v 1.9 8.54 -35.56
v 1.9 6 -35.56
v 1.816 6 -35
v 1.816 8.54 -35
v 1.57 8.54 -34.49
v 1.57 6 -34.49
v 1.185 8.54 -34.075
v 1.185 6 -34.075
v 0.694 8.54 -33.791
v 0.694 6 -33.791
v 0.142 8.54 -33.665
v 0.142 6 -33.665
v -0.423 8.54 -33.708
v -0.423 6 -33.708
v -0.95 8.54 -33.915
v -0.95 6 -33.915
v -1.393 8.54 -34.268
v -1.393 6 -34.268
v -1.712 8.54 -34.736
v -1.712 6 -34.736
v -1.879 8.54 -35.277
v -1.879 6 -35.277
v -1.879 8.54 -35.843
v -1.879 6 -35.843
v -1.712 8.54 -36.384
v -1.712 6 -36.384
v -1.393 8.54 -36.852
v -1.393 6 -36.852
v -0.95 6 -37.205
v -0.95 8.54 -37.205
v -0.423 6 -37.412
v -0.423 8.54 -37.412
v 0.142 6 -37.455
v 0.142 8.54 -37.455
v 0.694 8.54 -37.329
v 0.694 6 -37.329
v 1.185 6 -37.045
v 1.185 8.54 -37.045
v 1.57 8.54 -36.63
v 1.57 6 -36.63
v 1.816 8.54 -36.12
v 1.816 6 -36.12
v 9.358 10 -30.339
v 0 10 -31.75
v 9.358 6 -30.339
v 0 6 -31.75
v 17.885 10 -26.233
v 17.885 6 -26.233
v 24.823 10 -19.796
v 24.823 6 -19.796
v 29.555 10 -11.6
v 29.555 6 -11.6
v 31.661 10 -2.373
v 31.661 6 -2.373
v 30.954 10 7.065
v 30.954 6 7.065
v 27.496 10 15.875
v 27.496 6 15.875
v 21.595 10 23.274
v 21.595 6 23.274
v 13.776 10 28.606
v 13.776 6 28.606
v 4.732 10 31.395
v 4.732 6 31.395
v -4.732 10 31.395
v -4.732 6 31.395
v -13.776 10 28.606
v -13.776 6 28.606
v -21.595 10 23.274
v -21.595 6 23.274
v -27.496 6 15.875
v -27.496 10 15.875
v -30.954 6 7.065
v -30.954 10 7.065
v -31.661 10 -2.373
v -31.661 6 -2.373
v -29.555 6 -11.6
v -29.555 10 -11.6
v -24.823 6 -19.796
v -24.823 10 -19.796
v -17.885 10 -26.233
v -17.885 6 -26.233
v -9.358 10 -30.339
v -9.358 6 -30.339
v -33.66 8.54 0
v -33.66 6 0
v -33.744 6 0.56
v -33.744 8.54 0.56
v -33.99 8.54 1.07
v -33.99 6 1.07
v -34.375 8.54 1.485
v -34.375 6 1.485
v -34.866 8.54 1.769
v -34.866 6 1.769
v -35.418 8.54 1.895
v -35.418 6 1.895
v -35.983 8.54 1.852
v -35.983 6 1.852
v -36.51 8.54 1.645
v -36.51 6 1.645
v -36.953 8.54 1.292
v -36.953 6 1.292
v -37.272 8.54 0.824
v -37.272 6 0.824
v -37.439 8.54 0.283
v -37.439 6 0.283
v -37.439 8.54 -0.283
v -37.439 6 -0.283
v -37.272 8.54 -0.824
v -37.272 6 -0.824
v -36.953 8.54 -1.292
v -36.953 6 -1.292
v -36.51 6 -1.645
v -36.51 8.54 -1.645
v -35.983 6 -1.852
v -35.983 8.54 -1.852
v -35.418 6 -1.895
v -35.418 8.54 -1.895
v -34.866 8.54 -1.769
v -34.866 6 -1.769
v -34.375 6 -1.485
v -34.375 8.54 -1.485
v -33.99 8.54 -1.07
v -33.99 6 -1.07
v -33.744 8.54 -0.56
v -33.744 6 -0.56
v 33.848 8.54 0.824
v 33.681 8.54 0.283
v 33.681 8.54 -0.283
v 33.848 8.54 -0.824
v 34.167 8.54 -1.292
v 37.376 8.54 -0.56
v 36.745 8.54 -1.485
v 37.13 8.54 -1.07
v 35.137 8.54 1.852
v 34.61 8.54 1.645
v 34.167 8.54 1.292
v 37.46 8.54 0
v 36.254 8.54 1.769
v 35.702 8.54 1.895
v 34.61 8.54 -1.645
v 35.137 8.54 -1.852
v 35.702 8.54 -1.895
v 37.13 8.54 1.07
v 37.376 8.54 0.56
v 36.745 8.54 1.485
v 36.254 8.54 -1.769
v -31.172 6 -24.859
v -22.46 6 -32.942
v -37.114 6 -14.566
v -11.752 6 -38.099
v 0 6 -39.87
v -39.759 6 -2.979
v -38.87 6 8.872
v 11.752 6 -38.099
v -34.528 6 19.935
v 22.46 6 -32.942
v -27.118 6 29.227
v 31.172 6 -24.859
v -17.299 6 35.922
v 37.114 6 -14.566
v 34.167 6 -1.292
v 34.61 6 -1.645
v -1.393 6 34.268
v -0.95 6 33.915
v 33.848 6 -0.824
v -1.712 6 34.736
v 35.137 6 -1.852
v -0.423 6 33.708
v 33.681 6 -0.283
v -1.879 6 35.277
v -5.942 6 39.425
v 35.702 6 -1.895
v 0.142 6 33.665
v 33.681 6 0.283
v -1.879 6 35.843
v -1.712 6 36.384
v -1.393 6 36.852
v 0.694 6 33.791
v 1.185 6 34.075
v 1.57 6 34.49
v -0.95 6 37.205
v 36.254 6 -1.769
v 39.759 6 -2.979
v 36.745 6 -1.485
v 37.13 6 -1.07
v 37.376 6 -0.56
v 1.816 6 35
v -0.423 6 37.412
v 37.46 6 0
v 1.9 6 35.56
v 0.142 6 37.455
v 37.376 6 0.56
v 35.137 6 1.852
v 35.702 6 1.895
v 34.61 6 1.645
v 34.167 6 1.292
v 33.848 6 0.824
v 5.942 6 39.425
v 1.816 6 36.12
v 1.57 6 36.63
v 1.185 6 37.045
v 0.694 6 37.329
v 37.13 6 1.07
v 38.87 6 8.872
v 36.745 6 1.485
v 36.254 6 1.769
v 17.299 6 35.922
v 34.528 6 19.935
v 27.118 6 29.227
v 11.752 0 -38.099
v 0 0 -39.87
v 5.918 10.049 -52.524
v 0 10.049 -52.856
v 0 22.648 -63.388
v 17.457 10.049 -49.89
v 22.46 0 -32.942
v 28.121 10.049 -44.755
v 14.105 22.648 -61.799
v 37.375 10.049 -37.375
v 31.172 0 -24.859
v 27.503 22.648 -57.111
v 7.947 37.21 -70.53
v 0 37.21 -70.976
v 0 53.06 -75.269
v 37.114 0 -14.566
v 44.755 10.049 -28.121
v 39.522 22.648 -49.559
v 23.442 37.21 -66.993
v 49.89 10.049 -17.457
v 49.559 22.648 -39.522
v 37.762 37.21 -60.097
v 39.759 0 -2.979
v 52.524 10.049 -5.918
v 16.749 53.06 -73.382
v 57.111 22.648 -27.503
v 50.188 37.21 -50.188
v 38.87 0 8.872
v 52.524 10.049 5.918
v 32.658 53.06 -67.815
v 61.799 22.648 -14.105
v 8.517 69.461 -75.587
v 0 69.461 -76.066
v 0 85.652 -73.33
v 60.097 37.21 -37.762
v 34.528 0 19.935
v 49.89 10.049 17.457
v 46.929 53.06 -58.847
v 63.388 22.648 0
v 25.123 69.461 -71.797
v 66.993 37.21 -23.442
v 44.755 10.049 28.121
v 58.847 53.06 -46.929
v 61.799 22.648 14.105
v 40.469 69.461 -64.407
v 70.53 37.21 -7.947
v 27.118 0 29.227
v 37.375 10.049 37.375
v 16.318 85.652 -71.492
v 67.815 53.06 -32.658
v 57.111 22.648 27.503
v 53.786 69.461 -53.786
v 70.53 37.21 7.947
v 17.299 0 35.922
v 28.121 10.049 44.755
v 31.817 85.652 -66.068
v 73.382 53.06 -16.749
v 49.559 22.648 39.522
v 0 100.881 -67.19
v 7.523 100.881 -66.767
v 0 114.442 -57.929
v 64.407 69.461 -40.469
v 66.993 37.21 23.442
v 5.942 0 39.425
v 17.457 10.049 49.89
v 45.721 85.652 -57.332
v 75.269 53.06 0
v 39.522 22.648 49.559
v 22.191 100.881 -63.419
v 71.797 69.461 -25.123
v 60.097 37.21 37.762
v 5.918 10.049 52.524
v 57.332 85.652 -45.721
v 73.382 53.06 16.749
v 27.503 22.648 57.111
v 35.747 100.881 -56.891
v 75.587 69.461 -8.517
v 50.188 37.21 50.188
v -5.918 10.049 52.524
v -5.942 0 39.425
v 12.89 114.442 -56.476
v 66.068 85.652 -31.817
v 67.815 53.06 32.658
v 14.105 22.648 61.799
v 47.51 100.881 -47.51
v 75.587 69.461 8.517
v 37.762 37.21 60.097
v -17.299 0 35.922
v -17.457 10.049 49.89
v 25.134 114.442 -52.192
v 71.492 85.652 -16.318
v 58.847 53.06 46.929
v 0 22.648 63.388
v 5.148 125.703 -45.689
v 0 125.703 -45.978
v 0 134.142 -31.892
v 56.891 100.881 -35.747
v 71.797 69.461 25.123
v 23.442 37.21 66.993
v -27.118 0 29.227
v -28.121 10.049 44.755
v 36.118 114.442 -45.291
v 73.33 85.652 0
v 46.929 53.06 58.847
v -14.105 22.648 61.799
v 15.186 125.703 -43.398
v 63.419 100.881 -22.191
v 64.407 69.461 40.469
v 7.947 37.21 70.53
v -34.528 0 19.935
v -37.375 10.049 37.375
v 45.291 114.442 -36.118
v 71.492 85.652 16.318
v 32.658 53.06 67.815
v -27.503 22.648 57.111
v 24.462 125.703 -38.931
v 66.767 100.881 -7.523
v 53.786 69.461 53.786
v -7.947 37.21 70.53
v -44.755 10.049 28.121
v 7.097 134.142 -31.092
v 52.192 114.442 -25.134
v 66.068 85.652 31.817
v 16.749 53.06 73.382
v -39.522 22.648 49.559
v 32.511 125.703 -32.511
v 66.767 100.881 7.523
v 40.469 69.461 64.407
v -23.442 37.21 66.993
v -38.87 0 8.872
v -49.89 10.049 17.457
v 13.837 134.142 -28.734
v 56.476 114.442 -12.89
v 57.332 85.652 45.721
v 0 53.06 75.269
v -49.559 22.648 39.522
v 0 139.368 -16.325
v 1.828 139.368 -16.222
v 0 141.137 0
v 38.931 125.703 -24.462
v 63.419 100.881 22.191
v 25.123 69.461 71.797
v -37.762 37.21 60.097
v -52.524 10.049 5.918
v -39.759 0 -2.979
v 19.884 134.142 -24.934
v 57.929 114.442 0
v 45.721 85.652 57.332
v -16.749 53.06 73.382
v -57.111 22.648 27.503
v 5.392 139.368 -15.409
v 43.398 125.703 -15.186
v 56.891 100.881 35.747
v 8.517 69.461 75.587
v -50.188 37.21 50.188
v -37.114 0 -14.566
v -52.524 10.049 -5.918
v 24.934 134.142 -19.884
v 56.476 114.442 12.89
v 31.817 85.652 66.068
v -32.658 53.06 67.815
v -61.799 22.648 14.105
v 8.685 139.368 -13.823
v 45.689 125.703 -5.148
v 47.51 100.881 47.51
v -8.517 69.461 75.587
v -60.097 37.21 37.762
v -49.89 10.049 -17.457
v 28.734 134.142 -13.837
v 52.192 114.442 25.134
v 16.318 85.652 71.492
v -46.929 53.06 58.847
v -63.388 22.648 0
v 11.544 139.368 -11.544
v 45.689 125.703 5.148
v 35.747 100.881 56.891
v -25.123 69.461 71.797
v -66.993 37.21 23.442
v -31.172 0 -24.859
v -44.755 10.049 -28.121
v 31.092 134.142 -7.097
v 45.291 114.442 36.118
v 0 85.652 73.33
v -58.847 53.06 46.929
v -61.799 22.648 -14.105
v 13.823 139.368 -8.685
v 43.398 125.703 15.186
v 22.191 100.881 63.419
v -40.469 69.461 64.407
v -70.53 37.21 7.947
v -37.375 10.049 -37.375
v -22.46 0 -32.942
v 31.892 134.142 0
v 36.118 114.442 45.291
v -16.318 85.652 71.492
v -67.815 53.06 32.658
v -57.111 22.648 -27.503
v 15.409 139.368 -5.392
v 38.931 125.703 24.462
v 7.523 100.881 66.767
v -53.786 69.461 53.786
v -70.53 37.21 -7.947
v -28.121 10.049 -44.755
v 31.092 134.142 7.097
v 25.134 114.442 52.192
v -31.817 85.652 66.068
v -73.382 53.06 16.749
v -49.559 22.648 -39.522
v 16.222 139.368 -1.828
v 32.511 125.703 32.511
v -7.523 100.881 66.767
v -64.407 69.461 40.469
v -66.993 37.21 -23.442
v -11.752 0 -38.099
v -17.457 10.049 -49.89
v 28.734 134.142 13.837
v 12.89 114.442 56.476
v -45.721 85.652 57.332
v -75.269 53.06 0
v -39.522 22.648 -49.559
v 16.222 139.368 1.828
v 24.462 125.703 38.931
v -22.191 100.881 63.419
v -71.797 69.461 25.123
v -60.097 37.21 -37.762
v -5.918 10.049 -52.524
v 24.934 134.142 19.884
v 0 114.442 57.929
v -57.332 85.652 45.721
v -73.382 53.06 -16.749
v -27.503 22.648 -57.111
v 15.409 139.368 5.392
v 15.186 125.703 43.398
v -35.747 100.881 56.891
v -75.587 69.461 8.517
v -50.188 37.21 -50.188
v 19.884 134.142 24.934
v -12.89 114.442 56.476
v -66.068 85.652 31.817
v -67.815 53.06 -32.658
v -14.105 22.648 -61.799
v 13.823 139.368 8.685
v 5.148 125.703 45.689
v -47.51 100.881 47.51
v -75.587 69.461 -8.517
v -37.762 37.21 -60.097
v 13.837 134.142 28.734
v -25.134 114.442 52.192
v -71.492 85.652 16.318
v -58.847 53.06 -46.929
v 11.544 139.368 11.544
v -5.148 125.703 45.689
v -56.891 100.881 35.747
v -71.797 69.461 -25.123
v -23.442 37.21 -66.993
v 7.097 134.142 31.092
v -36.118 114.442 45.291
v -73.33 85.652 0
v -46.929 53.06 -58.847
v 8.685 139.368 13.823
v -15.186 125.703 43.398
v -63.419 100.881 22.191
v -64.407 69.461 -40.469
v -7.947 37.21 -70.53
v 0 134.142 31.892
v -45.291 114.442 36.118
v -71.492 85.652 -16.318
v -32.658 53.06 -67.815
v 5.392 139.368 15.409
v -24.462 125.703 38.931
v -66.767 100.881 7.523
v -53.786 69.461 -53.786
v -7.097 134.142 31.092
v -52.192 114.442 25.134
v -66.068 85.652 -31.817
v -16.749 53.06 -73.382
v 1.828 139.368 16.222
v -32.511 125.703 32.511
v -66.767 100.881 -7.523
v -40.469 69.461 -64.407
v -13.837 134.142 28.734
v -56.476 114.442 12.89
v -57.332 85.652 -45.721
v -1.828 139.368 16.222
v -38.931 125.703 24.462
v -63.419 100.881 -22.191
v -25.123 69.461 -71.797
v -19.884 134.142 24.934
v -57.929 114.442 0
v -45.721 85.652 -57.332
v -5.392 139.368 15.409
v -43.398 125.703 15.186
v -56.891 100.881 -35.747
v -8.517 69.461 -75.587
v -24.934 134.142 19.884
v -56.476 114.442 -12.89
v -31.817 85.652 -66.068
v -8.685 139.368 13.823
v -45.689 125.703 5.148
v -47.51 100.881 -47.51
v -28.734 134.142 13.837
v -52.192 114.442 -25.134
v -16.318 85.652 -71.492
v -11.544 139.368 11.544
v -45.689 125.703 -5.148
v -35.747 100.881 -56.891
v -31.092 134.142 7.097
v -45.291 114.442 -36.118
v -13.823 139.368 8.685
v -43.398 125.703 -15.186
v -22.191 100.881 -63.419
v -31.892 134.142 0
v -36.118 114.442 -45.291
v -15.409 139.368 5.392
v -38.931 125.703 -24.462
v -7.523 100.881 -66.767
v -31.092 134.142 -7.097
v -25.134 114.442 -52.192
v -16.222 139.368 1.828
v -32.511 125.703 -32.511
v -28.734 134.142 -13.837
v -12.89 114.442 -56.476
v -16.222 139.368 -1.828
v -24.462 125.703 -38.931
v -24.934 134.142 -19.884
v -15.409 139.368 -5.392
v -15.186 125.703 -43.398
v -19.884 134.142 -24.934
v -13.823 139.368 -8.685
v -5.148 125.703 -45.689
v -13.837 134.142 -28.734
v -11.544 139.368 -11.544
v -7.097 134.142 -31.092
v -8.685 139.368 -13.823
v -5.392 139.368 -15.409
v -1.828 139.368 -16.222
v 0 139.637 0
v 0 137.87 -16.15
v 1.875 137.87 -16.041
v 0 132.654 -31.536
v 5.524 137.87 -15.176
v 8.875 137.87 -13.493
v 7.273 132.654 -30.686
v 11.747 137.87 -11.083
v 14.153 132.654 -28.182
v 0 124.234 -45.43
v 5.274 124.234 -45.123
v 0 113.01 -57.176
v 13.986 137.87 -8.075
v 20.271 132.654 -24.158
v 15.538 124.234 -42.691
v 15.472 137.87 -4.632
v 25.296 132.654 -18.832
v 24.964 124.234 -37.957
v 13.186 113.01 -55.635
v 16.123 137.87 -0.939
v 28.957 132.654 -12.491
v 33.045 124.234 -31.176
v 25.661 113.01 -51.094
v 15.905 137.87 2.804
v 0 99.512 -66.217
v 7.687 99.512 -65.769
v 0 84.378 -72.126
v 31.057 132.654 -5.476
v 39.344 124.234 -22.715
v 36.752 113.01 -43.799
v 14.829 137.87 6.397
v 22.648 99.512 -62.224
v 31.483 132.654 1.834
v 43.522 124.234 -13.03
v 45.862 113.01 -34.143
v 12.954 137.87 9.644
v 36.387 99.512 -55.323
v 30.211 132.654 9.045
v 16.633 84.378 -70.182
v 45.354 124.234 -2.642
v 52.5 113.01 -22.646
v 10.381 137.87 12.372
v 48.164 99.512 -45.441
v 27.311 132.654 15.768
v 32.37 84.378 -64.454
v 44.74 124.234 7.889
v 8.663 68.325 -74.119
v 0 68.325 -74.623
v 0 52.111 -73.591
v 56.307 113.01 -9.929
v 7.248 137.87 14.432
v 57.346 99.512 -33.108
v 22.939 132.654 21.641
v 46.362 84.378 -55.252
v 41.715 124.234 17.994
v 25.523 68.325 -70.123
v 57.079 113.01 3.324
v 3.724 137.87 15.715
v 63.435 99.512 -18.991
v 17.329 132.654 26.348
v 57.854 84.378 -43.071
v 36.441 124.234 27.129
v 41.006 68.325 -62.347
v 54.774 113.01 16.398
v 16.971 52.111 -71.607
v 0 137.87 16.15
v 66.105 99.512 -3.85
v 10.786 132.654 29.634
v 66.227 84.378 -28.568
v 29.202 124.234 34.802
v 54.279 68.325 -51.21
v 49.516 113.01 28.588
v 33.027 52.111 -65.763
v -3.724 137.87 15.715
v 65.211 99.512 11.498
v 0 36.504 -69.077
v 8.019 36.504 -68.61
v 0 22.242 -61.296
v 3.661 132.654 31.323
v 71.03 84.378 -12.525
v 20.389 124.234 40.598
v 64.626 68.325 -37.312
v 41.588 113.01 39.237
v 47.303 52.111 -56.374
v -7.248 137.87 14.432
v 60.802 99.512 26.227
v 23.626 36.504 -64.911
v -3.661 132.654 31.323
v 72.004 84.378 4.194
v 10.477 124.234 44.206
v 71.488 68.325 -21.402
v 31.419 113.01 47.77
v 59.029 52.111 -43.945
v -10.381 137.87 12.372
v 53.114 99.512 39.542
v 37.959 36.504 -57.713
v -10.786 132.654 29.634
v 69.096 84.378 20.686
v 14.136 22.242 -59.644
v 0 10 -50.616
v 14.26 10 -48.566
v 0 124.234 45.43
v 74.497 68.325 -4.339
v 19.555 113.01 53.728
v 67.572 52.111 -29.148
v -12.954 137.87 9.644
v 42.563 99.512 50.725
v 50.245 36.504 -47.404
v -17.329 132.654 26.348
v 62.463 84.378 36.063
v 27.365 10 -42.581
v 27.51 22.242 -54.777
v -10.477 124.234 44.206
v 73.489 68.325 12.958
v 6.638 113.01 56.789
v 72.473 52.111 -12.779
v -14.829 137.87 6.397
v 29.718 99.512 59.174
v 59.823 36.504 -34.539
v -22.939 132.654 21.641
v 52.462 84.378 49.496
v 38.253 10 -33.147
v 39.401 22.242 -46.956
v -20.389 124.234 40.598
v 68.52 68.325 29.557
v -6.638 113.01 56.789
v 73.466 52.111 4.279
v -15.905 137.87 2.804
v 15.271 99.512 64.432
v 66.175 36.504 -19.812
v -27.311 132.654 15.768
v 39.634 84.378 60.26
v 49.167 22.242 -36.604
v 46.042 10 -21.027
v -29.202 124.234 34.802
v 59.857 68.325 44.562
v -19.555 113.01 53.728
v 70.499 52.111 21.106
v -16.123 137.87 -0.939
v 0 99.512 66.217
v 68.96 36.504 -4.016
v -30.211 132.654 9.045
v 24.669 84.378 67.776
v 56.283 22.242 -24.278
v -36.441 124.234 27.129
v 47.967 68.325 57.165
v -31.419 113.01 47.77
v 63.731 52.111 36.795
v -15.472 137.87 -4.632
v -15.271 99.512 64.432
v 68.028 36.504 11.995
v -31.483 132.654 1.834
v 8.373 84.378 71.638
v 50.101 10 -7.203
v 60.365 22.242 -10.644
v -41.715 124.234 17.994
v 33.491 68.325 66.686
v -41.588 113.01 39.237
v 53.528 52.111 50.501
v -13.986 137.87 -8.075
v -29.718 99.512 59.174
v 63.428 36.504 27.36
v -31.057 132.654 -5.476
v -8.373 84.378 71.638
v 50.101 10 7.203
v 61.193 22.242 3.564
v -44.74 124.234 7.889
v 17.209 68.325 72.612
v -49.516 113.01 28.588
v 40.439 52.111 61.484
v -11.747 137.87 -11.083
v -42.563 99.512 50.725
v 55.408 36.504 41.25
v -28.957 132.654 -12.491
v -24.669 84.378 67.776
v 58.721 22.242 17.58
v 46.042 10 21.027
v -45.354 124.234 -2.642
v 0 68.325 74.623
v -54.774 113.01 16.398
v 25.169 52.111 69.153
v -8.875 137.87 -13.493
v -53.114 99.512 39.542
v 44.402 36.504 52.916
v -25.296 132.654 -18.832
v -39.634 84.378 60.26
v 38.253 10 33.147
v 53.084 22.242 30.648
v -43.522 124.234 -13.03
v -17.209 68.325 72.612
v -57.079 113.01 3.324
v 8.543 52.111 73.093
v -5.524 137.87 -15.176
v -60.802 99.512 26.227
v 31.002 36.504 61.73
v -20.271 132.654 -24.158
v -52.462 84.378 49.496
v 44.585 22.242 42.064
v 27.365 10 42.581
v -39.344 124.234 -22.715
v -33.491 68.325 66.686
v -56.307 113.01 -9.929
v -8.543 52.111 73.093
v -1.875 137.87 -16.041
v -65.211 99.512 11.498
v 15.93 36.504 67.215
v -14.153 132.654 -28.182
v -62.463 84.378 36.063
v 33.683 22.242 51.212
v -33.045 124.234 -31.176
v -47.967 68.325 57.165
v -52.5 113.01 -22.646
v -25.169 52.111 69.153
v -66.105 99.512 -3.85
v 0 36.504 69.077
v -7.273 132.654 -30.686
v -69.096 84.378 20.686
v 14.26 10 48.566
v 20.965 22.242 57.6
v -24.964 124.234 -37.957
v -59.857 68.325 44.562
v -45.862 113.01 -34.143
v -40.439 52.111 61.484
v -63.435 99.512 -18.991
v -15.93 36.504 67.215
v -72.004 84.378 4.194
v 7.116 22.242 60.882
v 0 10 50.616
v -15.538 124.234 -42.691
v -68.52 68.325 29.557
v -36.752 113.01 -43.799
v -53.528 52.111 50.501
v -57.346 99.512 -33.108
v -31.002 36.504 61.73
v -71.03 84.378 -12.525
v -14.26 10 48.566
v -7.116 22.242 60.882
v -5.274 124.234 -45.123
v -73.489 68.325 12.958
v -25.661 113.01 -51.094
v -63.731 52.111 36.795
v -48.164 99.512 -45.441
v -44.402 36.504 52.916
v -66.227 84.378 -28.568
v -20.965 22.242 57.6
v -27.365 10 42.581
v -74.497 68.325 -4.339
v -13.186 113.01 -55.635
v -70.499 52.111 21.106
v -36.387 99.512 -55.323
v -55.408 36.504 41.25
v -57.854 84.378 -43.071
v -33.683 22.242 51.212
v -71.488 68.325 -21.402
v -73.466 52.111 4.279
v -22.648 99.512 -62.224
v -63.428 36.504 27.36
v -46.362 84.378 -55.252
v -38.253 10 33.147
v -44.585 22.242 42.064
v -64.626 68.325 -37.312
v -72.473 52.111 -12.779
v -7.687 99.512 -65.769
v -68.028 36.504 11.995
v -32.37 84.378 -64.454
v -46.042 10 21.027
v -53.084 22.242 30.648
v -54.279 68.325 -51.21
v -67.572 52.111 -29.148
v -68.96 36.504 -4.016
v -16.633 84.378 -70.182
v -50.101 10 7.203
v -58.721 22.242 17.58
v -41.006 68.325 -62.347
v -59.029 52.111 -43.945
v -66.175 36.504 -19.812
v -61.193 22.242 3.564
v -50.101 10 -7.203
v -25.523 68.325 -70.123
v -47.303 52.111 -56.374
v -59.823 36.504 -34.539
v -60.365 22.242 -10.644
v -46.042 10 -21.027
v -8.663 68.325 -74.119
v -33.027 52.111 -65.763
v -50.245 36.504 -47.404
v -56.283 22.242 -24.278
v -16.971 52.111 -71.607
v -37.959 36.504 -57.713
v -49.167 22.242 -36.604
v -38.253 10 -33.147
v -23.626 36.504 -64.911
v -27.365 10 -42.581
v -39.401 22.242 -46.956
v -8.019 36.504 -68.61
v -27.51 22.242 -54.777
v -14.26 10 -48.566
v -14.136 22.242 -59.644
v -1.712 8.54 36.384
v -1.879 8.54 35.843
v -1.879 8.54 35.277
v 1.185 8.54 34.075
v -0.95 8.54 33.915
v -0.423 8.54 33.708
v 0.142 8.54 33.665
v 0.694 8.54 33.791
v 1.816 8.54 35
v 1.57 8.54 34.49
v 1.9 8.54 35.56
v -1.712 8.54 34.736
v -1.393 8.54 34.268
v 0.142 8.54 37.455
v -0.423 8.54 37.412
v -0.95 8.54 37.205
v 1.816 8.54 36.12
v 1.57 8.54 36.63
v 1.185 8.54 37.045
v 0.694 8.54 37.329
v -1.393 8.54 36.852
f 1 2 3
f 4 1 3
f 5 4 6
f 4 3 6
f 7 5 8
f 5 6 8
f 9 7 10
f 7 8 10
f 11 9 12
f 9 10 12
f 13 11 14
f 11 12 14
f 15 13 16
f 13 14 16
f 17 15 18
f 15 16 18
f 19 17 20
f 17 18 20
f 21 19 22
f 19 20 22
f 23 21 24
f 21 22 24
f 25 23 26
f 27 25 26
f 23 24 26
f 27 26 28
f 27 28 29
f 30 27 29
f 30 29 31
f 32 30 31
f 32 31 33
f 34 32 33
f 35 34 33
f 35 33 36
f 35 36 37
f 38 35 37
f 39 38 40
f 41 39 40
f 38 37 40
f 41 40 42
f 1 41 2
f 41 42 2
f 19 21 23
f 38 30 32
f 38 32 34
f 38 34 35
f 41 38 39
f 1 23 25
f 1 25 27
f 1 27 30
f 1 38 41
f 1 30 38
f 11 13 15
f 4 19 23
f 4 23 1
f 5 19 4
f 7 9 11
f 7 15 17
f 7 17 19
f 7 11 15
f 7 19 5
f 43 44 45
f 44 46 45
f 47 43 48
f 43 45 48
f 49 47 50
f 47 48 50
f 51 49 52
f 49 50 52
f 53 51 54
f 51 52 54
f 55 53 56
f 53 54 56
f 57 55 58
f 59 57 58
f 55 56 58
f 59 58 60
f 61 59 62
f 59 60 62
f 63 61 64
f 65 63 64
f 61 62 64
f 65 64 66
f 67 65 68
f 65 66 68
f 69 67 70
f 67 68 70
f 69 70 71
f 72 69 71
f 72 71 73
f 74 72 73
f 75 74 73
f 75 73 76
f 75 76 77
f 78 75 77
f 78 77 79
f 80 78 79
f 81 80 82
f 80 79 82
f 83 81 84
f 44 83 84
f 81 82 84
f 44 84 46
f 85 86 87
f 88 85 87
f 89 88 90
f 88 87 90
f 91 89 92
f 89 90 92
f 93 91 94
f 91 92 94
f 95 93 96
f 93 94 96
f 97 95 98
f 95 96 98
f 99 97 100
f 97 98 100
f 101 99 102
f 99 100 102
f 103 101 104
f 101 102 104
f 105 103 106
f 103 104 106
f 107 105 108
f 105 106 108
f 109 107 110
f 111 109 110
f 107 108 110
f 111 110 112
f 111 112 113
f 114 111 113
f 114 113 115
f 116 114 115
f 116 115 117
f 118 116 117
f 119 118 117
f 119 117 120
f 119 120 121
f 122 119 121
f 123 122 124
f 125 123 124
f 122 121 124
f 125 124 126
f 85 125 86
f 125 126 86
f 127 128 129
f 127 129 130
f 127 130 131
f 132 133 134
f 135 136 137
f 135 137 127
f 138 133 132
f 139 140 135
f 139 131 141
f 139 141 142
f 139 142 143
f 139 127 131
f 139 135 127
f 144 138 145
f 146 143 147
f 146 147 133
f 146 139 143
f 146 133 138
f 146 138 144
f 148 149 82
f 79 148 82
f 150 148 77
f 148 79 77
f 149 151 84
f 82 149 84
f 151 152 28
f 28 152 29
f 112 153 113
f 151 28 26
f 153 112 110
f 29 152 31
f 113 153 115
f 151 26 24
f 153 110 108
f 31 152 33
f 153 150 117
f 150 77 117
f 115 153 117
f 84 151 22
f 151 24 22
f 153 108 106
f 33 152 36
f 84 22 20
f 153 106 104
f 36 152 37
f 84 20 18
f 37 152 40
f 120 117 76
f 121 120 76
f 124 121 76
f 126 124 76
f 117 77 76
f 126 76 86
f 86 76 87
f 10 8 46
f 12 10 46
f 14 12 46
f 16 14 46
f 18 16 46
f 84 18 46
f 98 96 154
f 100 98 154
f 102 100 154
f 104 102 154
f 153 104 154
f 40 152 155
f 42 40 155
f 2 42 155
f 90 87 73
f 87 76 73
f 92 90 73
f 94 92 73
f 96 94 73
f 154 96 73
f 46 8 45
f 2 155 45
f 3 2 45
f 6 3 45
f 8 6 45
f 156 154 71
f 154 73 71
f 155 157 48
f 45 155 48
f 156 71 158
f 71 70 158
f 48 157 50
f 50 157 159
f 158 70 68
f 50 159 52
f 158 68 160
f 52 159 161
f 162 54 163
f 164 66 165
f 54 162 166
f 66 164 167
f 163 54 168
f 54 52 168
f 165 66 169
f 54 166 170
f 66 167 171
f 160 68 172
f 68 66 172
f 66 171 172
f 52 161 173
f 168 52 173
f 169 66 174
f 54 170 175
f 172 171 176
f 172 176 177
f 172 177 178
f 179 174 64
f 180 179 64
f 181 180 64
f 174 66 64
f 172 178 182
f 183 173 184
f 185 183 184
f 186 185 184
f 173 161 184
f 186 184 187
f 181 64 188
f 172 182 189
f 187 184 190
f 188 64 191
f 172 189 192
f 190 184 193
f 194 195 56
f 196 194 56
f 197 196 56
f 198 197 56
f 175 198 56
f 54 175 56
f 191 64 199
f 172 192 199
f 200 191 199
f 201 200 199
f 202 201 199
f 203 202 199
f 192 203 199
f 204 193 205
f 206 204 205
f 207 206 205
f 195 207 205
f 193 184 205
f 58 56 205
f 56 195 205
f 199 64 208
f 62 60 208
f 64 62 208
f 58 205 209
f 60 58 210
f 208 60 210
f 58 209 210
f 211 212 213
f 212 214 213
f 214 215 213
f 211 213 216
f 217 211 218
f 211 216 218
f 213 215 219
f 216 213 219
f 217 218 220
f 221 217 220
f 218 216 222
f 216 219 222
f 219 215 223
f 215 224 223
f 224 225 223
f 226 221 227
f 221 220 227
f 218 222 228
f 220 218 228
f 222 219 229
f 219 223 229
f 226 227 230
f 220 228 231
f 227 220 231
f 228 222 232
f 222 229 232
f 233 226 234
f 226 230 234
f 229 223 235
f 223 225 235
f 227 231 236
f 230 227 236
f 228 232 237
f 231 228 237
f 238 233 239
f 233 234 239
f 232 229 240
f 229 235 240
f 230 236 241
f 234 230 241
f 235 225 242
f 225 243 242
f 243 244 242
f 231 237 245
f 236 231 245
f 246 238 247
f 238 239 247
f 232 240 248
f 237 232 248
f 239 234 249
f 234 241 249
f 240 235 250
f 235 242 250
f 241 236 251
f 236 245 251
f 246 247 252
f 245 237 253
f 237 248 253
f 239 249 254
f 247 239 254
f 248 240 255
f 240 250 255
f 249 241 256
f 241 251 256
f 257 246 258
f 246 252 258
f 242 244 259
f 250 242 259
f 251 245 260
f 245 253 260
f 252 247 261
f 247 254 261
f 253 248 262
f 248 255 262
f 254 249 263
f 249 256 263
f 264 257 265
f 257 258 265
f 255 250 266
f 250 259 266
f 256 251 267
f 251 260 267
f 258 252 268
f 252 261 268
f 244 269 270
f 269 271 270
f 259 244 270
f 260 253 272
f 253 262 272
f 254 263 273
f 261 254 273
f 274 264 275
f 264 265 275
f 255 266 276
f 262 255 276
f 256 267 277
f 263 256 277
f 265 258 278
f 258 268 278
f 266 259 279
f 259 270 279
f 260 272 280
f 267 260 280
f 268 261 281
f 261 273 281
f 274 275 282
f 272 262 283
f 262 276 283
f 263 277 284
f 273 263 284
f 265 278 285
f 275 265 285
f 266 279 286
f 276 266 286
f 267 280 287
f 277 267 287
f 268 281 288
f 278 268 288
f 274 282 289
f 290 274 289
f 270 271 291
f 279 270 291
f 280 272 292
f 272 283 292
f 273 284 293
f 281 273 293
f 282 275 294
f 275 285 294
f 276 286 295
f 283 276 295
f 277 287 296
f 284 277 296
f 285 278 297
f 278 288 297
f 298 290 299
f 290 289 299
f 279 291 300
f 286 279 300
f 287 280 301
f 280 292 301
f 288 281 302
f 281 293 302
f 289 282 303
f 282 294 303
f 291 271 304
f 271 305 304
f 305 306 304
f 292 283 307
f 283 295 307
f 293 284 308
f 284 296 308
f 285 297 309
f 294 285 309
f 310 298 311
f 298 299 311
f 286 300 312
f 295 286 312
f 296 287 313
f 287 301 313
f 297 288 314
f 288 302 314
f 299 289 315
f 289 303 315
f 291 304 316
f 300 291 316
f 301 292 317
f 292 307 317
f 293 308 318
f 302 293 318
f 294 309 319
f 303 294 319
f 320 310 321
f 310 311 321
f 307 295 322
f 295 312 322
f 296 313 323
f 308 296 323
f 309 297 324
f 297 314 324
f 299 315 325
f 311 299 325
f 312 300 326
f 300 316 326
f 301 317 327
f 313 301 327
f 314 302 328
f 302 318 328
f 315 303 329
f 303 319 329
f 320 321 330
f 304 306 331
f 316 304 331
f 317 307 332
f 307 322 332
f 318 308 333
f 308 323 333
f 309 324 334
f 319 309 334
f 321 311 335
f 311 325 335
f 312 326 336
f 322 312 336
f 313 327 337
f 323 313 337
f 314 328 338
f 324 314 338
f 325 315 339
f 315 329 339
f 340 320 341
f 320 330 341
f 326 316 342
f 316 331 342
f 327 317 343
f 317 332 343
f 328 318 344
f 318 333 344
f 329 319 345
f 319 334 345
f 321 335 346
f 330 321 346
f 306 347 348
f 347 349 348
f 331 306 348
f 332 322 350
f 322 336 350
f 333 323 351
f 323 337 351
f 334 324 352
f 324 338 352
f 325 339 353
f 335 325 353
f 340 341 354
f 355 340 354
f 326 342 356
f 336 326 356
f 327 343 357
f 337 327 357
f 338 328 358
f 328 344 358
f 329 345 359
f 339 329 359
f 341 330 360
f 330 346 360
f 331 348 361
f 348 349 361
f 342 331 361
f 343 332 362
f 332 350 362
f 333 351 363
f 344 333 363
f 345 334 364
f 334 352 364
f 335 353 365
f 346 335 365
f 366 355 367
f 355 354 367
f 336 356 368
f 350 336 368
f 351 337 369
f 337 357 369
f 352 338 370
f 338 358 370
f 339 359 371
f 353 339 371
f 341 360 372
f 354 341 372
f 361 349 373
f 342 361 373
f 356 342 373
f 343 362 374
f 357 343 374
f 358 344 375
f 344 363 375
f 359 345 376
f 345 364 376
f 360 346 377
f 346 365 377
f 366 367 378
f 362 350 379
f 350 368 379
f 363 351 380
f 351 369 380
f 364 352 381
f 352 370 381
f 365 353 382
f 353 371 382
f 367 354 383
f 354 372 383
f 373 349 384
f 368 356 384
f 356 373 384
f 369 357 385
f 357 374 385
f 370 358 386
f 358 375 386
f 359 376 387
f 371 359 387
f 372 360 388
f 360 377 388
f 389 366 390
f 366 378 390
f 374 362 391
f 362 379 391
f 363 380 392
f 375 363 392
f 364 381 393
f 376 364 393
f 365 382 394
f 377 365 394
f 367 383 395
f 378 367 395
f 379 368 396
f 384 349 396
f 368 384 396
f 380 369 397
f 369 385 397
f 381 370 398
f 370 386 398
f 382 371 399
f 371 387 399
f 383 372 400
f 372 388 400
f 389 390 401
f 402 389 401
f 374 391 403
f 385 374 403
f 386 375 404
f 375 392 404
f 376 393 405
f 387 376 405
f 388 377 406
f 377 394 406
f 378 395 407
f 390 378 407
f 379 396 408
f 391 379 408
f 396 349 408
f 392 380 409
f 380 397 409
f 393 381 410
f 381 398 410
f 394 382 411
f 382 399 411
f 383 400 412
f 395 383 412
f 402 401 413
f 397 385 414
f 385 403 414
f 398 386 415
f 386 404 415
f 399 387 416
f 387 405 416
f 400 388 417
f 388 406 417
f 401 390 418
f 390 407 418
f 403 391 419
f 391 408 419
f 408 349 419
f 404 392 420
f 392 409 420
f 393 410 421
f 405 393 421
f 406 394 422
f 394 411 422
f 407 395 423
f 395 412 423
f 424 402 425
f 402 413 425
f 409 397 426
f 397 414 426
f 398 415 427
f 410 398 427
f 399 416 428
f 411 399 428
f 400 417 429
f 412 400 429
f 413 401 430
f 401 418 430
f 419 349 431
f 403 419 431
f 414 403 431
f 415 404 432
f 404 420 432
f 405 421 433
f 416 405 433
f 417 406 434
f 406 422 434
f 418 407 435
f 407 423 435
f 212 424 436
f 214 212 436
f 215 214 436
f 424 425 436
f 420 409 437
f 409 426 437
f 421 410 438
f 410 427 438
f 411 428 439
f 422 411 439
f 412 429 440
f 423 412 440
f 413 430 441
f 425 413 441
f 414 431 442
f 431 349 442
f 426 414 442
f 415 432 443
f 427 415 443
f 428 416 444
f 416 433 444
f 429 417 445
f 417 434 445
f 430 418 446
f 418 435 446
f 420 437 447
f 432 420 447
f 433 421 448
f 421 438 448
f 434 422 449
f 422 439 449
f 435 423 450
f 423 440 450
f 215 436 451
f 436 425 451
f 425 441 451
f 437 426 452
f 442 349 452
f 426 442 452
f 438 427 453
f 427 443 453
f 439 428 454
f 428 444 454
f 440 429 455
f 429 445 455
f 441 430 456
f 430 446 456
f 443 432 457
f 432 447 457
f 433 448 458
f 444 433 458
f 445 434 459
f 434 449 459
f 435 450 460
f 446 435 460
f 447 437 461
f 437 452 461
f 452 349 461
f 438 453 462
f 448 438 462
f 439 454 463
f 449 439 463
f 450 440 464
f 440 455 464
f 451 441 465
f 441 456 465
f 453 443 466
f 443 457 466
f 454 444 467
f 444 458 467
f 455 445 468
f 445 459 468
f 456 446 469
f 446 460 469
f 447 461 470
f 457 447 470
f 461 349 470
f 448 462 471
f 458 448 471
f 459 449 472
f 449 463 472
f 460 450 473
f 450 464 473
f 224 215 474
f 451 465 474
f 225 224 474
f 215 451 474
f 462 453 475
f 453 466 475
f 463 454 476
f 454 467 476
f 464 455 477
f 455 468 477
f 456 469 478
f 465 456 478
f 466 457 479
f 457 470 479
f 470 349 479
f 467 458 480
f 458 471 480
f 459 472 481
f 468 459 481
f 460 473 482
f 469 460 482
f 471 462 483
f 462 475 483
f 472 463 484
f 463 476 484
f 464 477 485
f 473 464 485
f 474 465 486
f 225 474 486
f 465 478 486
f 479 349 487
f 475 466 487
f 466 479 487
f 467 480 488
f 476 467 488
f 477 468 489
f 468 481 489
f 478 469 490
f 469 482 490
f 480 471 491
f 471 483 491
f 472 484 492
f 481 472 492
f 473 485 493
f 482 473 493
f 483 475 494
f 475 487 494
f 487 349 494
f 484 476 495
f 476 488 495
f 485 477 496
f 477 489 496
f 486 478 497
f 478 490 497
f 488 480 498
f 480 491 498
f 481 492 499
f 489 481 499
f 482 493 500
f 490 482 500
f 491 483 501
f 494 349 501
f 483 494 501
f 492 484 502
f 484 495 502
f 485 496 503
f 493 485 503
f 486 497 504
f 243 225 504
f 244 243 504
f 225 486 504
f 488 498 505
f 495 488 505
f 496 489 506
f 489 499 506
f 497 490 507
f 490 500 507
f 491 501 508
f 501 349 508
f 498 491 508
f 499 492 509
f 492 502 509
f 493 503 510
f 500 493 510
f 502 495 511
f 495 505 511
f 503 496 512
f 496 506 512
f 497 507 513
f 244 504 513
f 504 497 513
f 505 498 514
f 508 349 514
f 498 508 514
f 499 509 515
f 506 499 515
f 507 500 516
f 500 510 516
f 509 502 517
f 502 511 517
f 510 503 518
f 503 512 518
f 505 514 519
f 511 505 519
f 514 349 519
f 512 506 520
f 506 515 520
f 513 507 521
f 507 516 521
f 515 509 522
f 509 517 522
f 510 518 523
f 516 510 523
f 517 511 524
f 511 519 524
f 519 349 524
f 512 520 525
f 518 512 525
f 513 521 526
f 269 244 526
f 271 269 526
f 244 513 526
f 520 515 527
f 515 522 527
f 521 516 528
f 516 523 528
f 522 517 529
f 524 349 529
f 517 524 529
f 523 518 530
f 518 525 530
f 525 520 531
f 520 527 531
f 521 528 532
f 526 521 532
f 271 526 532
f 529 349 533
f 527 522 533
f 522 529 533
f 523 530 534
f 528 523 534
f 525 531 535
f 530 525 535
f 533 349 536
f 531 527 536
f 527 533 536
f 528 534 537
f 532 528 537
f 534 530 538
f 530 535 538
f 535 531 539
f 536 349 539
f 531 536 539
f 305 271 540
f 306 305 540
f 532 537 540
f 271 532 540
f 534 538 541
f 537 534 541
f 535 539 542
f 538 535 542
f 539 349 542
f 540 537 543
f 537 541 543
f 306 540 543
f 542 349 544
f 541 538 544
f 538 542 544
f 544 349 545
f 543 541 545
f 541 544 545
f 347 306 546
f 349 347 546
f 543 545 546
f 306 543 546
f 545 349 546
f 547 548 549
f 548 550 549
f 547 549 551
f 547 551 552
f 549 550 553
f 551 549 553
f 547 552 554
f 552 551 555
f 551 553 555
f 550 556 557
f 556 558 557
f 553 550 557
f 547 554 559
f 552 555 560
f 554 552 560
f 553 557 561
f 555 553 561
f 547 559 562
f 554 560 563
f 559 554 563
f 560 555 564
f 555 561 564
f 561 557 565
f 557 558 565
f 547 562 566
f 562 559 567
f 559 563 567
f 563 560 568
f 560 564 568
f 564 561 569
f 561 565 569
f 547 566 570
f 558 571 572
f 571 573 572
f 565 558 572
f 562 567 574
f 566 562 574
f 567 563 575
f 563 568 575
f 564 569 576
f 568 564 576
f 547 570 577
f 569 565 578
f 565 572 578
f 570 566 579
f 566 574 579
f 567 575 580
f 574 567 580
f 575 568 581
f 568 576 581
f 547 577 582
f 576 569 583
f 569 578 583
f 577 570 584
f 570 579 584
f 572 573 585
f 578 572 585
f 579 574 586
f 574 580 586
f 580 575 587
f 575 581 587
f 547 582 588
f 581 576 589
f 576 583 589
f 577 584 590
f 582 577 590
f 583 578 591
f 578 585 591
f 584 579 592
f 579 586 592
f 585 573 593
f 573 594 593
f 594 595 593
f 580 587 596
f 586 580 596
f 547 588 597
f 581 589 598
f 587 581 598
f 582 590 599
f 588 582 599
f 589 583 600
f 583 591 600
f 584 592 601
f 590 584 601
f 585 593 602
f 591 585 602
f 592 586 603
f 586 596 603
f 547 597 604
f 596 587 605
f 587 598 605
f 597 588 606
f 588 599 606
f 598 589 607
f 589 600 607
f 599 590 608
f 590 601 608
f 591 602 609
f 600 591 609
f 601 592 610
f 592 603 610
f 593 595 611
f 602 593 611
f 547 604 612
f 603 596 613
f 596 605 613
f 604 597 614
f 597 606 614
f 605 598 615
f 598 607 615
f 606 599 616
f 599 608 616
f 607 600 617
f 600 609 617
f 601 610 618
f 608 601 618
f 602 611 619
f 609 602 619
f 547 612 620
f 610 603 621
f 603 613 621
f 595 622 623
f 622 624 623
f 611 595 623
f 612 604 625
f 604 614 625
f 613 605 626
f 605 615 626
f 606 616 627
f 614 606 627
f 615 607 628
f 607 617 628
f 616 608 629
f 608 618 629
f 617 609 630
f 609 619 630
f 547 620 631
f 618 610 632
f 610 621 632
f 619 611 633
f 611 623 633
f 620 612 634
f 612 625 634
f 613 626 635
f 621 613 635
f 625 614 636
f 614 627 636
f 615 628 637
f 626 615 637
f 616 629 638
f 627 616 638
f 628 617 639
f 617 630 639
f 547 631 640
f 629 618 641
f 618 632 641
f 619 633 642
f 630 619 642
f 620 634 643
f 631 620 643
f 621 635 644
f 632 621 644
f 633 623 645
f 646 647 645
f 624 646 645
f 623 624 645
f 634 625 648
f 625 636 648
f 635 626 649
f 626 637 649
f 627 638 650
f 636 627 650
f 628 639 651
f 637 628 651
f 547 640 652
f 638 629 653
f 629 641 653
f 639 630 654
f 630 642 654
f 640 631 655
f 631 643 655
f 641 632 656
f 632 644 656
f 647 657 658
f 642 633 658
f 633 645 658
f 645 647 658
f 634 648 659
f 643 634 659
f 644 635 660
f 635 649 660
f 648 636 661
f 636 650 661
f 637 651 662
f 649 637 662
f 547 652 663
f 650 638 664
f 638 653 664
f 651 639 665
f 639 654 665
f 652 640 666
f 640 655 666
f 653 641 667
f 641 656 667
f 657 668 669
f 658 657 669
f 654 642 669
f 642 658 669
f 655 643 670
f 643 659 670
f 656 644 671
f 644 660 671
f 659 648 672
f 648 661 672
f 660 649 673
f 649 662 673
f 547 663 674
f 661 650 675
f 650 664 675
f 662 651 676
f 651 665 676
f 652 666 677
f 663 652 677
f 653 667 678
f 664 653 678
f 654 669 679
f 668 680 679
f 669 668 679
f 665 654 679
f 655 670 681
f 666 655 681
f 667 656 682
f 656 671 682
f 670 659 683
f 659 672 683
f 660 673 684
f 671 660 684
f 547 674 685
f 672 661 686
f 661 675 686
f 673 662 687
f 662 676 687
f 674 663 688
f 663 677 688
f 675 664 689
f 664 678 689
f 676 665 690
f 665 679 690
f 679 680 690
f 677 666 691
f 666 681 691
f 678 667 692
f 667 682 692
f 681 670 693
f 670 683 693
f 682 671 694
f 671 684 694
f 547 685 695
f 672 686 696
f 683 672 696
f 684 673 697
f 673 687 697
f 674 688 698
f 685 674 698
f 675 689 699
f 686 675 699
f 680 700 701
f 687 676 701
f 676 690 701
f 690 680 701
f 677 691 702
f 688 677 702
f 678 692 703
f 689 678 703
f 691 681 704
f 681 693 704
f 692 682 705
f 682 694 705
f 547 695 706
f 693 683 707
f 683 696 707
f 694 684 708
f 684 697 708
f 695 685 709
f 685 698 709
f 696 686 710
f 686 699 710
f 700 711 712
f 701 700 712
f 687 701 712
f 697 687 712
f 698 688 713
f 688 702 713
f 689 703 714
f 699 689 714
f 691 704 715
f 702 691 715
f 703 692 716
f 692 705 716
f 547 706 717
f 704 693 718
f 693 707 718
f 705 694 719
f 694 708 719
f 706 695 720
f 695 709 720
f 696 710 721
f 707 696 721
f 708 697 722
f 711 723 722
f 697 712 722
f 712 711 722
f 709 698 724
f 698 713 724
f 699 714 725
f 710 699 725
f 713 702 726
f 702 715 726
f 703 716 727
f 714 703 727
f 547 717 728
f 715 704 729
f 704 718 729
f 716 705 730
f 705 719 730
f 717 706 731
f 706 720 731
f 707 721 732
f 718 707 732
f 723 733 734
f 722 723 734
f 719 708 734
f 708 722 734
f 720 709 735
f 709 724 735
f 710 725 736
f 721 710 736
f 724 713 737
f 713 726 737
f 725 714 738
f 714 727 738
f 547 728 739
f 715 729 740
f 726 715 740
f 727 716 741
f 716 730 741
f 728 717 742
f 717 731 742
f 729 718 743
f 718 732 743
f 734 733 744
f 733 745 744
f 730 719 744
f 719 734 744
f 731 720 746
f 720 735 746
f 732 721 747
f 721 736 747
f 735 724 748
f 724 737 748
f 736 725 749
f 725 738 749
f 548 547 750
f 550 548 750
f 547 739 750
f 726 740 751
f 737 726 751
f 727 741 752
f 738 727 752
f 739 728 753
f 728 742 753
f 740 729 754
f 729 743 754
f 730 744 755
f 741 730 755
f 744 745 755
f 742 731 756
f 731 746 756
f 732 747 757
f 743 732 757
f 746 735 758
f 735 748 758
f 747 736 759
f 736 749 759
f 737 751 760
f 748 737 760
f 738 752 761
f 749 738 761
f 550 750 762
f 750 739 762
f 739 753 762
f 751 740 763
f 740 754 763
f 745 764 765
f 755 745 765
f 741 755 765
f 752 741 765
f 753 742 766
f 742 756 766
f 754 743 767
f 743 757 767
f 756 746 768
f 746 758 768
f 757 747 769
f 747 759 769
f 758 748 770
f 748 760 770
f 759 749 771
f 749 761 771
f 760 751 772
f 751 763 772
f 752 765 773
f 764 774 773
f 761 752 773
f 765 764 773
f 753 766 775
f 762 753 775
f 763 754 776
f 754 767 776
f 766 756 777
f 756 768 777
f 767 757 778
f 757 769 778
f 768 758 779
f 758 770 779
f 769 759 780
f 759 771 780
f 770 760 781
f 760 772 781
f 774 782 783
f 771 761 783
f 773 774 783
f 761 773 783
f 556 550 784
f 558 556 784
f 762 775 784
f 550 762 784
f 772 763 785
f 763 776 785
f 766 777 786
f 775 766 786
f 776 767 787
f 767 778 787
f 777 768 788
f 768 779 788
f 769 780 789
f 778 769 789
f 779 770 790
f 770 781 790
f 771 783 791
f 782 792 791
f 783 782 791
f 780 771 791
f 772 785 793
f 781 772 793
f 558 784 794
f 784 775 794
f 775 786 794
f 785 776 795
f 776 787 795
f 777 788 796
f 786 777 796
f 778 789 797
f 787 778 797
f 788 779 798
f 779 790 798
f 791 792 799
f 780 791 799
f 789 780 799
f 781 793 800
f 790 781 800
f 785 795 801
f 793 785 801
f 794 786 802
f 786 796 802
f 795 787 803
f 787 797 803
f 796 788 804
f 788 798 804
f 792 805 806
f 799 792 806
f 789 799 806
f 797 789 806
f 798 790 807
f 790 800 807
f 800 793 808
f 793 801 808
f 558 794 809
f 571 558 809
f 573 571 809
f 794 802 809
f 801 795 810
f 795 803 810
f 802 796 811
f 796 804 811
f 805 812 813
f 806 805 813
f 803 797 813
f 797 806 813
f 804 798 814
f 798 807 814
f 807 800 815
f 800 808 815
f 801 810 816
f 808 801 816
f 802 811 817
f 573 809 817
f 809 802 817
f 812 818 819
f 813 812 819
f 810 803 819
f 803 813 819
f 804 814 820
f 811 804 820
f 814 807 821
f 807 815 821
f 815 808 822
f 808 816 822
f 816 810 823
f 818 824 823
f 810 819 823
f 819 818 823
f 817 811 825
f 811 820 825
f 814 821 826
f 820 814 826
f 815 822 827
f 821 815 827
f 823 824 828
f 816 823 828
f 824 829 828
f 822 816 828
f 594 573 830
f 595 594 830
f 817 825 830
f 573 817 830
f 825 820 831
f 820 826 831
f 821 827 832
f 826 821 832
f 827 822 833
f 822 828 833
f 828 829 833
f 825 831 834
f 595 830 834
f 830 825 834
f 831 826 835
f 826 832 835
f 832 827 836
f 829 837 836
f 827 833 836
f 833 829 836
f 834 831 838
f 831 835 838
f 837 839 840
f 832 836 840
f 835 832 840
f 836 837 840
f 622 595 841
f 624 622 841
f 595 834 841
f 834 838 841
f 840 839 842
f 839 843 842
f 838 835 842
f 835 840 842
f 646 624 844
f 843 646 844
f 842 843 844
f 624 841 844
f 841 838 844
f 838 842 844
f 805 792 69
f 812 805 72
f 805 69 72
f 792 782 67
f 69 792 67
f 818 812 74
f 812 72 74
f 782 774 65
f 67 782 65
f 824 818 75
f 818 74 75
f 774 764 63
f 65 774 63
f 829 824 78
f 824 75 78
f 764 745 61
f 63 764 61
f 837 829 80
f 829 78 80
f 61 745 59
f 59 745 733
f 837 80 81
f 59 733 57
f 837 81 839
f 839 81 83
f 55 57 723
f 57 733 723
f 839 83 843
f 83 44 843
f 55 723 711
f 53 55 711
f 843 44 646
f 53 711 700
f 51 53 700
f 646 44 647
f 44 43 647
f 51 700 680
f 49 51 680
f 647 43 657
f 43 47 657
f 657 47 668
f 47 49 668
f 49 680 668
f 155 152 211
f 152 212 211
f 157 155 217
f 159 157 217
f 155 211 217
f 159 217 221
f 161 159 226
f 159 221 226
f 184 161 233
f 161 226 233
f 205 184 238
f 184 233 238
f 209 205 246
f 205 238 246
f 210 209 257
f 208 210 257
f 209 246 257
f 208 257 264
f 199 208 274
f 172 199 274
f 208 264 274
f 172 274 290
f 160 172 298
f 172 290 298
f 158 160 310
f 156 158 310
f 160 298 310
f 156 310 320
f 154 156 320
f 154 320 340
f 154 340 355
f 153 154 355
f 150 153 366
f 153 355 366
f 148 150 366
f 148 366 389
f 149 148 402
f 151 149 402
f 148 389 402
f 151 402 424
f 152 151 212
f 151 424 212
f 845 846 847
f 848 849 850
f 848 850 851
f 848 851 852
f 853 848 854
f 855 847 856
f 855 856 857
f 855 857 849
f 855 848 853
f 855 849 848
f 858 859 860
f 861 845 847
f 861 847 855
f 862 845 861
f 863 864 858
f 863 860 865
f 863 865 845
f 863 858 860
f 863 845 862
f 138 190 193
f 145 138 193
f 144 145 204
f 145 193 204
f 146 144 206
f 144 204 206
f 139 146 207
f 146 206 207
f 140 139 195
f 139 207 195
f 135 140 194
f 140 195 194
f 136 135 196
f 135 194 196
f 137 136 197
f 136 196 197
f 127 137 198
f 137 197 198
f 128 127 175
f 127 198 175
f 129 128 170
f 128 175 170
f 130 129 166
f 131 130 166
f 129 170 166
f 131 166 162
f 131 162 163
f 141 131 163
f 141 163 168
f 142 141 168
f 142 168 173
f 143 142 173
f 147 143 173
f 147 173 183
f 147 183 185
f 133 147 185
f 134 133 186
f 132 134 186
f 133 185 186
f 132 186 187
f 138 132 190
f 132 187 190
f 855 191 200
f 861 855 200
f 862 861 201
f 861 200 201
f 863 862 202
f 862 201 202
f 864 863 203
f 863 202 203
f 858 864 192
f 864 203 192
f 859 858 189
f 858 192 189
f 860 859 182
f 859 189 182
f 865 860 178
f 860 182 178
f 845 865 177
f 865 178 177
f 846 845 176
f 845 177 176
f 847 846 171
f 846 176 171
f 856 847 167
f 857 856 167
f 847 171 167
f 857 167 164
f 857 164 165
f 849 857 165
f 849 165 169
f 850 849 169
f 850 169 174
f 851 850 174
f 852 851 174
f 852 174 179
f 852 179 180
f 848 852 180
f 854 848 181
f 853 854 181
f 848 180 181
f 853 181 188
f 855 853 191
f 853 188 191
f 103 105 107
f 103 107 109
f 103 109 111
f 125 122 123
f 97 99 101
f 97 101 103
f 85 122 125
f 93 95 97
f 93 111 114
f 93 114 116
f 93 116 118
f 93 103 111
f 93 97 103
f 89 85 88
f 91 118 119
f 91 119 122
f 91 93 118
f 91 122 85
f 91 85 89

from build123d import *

# Parameters (mm, degrees)
SKETCH2_R          = 1.9
CUT_EXTRUDE1_DEPTH = 2.54


with BuildPart() as part:
    # Sketch1 → Revolve1 (revolve)
    with BuildSketch(Plane(origin=(0, 0, 0), x_dir=(0, 0, -1), z_dir=(1, 0, 0))):
        with BuildLine():
            Line((0, 141.137070307), (0, 139.637070307))
            ThreePointArc((0, 139.637070307), (69.584082777, 92.105902156), (50.616284989, 10))
            Line((50.616284989, 10), (31.75, 10))
            Line((31.75, 10), (31.75, 6))
            Line((31.75, 6), (39.87, 6))
            Line((39.87, 6), (39.87, 0))
            ThreePointArc((39.87, 0), (73.330228274, 85.652224695), (0, 141.137070307))
        make_face()
    revolve(axis=Axis((0, 141.137070307, 0), (0, -1, 0)))

    # Sketch2 → Cut-Extrude1 (cut)
    with BuildSketch(Plane.XZ.offset(-6)):
        with Locations((0, 35.56)):
            Circle(SKETCH2_R)
        with Locations((35.56, 0)):
            Circle(SKETCH2_R)
        with Locations((0, -35.56)):
            Circle(SKETCH2_R)
        with Locations((-35.56, 0)):
            Circle(SKETCH2_R)
    extrude(amount=-CUT_EXTRUDE1_DEPTH, mode=Mode.SUBTRACT)


solid = part.part
